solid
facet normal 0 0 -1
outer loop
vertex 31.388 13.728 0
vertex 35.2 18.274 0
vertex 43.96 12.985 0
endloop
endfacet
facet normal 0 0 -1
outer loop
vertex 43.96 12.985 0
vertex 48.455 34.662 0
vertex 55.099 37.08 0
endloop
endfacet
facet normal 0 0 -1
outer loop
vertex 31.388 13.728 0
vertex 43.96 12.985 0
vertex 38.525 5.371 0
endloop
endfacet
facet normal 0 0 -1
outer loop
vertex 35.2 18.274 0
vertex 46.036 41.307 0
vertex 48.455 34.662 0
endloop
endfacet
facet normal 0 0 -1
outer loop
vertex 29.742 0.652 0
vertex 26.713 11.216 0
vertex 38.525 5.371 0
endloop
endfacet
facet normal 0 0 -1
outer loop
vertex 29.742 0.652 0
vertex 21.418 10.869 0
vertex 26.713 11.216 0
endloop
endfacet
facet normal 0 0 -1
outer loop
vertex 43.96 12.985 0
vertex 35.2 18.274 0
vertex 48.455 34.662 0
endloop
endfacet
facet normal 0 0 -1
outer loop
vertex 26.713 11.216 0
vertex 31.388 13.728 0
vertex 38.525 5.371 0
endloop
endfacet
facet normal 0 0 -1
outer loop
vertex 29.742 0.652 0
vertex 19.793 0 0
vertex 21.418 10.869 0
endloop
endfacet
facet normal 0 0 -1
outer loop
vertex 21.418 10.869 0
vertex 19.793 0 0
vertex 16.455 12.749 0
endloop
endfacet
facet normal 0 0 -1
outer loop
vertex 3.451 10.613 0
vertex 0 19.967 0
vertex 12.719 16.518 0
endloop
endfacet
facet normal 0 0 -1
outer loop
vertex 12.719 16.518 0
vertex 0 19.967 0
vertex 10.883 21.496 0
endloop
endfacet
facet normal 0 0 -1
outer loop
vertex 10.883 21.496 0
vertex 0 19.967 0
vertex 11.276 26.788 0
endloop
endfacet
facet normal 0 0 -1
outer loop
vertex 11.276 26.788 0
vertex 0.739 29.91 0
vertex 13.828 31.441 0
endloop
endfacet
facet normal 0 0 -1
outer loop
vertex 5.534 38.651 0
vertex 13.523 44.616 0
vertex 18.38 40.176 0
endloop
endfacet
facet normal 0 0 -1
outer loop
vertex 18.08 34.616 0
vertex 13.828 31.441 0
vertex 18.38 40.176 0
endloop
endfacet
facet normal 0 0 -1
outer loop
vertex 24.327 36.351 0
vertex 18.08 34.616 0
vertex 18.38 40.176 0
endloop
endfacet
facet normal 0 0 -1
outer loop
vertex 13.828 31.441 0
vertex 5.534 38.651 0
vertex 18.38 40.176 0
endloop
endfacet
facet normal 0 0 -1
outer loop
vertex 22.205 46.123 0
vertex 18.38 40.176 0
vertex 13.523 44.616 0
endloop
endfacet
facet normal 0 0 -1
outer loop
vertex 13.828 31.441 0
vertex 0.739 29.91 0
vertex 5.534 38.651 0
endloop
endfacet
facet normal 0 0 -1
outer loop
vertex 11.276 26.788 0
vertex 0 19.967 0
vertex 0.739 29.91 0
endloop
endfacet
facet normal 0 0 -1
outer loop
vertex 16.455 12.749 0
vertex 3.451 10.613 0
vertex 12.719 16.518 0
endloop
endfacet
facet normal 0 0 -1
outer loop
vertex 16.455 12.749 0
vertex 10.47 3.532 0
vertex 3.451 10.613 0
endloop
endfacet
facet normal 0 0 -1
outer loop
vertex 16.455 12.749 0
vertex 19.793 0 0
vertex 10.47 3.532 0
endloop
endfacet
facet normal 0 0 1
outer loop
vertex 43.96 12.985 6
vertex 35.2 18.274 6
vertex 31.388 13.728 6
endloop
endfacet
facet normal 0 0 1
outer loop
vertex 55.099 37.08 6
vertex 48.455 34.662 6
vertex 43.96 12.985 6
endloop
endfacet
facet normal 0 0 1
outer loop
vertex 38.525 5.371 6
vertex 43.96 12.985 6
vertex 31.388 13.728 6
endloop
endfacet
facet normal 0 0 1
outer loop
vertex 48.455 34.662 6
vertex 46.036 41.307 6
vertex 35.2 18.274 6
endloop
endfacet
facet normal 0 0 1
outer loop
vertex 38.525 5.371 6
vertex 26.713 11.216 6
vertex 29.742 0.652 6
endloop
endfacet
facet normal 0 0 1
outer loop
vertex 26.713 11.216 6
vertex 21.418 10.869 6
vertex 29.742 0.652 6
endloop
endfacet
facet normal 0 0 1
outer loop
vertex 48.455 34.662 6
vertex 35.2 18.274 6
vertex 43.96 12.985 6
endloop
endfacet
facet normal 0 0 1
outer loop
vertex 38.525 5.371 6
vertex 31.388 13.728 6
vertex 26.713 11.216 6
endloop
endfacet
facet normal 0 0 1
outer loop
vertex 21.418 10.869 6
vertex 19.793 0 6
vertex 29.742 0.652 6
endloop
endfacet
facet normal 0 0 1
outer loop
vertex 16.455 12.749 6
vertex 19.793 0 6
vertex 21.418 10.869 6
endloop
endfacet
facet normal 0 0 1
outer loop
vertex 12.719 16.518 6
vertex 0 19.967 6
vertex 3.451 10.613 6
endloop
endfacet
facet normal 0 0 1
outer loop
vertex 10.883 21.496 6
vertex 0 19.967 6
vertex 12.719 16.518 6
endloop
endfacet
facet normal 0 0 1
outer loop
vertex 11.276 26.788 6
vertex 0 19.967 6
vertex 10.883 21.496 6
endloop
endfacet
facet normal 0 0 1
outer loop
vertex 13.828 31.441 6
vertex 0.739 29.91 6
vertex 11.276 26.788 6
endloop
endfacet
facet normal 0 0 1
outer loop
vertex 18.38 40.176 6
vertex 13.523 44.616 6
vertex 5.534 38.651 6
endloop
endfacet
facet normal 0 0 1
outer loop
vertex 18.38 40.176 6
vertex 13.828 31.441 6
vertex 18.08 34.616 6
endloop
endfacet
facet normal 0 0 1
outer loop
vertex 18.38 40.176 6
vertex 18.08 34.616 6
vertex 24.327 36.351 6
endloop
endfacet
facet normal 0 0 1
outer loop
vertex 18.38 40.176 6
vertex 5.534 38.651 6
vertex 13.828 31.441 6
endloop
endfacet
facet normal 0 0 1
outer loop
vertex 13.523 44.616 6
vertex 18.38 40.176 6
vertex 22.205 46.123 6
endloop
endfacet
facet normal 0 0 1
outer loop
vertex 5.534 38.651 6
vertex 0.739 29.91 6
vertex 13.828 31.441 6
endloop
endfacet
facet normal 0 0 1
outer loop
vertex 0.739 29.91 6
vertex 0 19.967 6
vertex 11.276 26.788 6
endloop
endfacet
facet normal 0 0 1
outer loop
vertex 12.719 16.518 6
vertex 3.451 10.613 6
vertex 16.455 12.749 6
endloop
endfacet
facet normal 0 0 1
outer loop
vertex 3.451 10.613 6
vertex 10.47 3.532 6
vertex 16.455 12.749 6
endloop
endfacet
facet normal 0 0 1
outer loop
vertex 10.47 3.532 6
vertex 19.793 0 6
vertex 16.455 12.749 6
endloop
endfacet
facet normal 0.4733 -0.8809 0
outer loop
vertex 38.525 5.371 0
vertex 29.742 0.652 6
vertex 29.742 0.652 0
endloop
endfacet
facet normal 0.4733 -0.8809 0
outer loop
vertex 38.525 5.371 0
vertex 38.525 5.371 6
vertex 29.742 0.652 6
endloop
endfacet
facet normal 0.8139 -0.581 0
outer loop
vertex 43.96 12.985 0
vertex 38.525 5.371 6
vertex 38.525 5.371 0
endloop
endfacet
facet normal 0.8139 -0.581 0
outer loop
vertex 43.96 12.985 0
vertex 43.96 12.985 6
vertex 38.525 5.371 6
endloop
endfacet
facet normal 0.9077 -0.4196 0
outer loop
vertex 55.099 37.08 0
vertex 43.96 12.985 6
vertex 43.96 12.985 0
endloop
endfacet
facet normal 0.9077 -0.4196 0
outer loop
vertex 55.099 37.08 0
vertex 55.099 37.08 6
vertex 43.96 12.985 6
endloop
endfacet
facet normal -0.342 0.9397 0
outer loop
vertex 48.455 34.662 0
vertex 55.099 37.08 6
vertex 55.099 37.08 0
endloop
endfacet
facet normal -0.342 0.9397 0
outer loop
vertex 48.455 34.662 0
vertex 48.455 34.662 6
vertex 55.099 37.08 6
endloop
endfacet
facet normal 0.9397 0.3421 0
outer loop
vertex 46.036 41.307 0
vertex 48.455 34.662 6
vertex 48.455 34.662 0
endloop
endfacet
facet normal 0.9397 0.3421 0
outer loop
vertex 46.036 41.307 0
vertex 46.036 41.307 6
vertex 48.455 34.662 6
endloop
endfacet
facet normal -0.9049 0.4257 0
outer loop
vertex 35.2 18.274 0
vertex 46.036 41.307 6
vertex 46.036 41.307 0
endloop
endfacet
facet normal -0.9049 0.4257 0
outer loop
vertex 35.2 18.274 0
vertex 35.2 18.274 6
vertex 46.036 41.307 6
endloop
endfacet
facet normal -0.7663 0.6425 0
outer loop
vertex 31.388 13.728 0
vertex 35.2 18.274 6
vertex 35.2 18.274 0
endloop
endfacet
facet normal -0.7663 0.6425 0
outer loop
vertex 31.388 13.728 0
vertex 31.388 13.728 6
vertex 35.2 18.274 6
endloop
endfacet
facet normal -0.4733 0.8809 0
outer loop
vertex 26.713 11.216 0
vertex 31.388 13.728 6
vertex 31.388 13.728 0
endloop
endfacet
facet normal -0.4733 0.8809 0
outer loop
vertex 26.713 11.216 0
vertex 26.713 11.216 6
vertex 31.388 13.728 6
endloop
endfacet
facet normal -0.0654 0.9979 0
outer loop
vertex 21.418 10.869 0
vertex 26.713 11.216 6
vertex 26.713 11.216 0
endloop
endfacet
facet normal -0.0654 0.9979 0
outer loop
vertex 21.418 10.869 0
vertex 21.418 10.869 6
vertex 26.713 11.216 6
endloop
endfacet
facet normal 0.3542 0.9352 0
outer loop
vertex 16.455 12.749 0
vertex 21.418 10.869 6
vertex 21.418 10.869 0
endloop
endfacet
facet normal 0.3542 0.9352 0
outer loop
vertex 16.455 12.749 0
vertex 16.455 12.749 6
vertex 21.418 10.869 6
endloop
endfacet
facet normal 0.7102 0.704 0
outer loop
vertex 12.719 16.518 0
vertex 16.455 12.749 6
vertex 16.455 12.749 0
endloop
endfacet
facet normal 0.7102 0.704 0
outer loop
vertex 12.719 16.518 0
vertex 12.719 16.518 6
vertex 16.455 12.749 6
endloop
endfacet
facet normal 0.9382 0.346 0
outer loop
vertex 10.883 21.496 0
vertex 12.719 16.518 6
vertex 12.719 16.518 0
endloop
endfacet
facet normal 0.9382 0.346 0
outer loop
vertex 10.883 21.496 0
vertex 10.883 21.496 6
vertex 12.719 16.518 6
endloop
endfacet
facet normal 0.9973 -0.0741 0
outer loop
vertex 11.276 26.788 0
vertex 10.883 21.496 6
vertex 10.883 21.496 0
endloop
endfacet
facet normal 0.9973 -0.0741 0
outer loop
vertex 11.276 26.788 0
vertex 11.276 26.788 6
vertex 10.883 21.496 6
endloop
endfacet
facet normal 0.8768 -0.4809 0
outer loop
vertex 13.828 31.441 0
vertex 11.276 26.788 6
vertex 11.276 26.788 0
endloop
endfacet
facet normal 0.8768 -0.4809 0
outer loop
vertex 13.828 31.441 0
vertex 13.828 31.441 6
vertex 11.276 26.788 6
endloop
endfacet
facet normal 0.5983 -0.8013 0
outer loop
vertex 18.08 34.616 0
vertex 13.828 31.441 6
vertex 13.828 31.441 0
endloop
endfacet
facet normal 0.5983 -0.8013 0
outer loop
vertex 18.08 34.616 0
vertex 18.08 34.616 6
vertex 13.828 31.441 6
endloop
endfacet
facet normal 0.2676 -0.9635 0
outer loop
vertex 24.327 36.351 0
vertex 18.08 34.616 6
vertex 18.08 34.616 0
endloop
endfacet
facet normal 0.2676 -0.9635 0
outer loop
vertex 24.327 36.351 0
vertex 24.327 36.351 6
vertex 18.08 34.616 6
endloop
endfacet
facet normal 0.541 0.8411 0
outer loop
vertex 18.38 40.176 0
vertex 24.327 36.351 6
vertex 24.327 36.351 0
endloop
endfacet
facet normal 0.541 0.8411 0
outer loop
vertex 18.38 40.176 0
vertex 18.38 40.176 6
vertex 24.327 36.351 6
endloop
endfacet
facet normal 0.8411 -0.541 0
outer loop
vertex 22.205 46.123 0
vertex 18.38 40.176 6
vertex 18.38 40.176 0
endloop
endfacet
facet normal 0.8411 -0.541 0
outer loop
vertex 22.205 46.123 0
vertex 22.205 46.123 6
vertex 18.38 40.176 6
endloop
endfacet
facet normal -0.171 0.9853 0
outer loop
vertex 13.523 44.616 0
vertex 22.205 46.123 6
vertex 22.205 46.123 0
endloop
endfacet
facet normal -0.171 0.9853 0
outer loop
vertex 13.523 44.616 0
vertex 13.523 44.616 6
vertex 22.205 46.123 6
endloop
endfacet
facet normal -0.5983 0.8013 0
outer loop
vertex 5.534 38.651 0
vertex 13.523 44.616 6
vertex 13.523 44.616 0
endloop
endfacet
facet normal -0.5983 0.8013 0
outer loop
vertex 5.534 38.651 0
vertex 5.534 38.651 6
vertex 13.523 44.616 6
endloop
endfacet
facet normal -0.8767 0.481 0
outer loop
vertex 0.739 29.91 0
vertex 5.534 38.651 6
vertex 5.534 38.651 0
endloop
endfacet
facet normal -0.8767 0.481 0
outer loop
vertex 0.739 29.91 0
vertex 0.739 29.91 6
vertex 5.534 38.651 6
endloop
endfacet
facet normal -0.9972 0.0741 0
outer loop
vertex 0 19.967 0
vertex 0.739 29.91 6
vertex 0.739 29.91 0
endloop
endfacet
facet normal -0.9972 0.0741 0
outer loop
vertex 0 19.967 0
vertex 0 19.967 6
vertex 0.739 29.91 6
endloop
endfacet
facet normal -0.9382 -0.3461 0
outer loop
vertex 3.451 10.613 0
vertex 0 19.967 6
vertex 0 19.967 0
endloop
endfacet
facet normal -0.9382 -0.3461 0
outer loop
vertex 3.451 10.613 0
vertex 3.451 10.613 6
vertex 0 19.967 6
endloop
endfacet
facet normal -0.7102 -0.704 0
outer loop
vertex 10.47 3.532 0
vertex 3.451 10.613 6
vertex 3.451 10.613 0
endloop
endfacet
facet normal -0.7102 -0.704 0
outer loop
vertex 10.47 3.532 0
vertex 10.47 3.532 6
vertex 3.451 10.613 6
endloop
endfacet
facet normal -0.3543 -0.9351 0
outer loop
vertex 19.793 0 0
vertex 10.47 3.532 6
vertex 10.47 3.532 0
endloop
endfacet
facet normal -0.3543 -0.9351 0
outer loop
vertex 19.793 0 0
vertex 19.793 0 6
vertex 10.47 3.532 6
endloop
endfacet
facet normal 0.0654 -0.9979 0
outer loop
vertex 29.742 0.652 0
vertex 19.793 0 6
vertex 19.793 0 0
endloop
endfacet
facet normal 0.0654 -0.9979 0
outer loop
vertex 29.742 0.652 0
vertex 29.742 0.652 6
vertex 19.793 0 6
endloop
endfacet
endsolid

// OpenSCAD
$fn = 32;

// ----------------------------------------------------------------------
// Hook plate: curl radius 18 mm over 245 degrees, 10 mm thick band
// ----------------------------------------------------------------------

// --- parameters (mm) ---
profile_height = 6;       // extrusion height
profile_points = 26;      // points of the closed outline

profile = [[18.38, 40.176], [22.205, 46.123], [13.523, 44.616], [5.534, 38.651], [0.739, 29.91], [0, 19.967], [3.451, 10.613], [10.47, 3.532], [19.793, 0], [29.742, 0.652], [38.525, 5.371], [43.96, 12.985], [55.099, 37.08], [48.455, 34.662], [46.036, 41.307], [35.2, 18.274], [31.388, 13.728], [26.713, 11.216], [21.418, 10.869], [16.455, 12.749], [12.719, 16.518], [10.883, 21.496], [11.276, 26.788], [13.828, 31.441], [18.08, 34.616], [24.327, 36.351]];  // single closed polygon, 26 points, counter clockwise

// --- the one profile operation ---
linear_extrude(height = profile_height) polygon(points = profile);
